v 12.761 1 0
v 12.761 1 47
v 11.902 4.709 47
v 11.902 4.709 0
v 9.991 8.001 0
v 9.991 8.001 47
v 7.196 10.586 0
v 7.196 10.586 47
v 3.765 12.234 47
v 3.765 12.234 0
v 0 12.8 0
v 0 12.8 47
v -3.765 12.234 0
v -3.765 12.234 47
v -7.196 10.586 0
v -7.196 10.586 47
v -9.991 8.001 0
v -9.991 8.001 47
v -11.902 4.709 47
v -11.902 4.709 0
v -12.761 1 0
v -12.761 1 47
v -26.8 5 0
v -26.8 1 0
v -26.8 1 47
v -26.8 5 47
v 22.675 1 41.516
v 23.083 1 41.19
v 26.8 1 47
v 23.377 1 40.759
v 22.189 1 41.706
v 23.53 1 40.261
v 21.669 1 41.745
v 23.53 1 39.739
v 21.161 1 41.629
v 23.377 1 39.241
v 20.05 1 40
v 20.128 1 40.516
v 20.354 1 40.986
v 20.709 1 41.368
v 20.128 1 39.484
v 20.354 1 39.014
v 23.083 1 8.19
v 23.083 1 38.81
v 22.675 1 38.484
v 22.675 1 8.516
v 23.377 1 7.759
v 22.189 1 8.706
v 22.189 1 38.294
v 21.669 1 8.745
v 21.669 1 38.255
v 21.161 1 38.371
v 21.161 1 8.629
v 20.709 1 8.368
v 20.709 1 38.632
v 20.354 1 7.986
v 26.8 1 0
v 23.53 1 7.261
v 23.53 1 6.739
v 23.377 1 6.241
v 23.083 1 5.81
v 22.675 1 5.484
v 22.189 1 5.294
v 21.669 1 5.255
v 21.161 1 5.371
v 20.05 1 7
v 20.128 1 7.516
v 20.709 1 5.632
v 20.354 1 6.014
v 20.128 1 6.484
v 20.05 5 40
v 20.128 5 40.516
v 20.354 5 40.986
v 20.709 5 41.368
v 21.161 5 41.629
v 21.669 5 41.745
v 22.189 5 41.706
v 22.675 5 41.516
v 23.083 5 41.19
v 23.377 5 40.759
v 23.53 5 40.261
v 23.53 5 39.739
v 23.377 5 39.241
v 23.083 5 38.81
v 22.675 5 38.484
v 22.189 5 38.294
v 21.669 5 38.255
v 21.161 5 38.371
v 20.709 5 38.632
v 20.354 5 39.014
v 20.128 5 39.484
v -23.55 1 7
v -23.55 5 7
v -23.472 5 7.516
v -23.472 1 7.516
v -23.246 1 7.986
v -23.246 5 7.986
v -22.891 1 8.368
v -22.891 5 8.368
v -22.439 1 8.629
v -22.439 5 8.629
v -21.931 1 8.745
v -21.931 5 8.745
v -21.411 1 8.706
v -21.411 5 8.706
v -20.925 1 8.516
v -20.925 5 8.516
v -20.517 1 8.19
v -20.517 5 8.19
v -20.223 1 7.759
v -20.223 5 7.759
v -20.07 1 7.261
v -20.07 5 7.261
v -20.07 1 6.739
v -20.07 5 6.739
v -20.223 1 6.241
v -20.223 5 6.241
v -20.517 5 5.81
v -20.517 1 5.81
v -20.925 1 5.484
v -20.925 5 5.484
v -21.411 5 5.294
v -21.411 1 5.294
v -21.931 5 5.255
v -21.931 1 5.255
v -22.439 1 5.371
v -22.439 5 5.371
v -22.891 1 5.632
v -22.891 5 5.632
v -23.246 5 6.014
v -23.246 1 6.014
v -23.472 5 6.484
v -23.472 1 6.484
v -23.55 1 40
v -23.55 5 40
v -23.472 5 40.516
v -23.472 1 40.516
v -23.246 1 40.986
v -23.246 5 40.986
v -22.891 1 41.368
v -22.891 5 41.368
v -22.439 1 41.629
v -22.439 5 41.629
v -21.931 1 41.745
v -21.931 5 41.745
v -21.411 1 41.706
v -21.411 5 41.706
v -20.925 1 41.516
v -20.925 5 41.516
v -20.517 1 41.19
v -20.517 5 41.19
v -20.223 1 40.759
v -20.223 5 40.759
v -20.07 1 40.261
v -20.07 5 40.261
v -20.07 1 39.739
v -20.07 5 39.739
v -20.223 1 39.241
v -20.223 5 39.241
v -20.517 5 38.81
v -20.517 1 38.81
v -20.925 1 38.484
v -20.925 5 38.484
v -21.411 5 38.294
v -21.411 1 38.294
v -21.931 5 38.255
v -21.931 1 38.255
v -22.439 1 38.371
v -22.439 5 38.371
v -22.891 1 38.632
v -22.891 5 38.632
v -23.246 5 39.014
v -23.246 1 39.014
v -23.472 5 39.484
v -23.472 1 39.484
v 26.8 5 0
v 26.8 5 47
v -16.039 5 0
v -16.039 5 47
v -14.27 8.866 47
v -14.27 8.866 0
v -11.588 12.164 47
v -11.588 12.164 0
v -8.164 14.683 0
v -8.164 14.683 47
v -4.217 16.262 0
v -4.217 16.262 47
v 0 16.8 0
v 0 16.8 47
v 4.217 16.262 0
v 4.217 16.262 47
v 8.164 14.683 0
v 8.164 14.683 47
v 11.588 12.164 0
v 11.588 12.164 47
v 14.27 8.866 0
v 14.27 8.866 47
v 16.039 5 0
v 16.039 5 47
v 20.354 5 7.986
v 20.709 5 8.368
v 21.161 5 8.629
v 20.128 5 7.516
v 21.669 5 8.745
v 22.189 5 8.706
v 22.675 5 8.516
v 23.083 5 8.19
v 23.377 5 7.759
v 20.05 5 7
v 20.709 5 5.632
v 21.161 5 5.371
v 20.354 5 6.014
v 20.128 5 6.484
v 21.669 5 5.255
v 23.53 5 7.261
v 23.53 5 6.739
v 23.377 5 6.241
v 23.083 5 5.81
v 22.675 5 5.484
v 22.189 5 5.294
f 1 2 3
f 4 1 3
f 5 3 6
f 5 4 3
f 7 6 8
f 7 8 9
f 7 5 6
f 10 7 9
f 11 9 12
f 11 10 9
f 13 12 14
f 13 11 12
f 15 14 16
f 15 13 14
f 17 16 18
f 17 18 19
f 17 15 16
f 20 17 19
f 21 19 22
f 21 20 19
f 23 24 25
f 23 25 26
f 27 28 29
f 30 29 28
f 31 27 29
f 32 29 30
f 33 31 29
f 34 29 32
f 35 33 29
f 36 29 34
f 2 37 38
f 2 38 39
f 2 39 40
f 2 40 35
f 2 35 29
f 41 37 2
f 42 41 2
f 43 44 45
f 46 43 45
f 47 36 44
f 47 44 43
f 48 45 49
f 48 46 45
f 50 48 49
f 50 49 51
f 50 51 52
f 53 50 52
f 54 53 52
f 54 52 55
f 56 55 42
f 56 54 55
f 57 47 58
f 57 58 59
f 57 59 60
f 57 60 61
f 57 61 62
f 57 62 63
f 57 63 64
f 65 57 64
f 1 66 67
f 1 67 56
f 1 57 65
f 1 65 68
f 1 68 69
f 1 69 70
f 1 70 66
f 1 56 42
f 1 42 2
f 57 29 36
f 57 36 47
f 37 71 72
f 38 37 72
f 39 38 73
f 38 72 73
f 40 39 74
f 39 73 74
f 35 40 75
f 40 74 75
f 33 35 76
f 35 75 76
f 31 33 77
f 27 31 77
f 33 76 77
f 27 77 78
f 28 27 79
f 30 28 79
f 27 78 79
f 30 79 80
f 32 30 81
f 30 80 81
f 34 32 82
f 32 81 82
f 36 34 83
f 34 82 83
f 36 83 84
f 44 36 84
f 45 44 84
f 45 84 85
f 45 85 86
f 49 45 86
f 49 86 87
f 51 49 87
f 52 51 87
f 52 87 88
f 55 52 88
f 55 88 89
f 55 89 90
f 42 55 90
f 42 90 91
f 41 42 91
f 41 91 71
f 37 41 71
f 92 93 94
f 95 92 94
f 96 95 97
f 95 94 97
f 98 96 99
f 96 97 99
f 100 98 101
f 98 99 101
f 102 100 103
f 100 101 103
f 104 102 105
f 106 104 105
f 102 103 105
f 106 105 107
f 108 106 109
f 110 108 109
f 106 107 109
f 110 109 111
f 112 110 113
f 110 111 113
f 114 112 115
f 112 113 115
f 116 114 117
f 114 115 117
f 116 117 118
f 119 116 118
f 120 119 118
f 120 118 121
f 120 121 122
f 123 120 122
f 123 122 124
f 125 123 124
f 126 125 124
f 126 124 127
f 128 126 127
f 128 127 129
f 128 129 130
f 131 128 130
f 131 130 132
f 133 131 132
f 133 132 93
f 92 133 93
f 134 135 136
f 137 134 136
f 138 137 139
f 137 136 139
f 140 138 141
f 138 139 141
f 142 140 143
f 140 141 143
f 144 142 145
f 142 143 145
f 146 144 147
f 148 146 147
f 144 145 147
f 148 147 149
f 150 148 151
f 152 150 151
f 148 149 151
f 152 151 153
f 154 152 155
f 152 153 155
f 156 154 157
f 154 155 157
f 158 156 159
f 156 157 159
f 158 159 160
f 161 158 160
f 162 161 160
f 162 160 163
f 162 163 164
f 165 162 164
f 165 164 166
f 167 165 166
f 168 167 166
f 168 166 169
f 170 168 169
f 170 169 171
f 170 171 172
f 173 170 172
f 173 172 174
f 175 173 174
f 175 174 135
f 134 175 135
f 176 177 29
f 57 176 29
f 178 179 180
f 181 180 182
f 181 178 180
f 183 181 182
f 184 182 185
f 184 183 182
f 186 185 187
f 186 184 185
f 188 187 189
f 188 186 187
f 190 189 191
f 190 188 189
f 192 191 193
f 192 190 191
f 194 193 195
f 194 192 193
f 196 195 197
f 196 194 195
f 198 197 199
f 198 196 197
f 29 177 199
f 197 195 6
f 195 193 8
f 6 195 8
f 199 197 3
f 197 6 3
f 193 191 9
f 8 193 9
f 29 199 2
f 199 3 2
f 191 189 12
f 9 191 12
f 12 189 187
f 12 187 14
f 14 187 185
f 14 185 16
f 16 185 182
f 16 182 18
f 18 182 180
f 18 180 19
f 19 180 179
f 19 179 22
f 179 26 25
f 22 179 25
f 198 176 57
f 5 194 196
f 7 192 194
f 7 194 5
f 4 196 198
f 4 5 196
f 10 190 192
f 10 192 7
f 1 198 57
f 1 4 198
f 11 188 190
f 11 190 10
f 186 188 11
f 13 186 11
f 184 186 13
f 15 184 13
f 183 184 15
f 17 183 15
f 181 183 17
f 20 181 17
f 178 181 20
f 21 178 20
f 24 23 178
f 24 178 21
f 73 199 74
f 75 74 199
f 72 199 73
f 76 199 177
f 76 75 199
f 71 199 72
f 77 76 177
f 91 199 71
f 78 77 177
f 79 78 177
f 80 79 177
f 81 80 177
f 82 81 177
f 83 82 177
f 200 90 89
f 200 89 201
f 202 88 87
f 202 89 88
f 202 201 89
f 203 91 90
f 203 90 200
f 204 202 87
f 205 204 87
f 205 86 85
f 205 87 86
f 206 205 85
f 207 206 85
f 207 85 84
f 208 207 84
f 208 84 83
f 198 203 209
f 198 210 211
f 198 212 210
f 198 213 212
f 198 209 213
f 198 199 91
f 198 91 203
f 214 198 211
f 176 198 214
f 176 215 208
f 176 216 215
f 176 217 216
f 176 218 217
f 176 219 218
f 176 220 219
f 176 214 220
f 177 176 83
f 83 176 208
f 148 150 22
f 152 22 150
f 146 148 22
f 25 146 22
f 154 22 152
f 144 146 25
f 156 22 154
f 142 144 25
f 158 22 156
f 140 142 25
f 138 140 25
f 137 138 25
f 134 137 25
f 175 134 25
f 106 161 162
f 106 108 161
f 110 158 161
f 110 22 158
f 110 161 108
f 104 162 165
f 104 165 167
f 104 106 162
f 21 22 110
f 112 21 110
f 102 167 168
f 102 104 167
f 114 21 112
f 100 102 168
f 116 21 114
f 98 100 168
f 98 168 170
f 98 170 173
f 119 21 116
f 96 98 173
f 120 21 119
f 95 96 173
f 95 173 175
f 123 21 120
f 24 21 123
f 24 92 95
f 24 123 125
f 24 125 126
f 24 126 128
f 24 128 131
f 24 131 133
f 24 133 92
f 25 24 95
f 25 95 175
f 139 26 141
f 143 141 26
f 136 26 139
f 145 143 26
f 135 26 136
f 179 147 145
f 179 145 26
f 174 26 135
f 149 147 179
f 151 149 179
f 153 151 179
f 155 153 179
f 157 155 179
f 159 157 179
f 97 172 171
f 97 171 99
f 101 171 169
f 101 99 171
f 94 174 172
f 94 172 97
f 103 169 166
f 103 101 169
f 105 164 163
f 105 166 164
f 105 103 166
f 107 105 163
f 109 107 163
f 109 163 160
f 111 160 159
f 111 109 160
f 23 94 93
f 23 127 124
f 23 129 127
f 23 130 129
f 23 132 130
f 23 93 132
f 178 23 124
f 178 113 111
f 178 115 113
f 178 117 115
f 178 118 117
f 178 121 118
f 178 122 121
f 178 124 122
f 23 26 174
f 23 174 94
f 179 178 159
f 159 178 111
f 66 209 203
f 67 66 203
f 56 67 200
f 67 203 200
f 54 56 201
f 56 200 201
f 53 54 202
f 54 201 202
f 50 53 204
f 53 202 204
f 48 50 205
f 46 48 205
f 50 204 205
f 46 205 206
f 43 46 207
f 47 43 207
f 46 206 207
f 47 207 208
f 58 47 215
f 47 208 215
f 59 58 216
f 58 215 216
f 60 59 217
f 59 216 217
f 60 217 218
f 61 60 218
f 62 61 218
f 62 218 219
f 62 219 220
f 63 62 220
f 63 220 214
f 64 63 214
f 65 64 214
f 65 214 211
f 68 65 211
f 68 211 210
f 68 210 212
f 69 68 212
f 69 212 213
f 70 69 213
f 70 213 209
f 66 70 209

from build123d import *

# Parameters (mm, degrees)
BOSS_EXTRUDE1_DEPTH = 47
CUT_EXTRUDE1_REACH  = 57.376
SKETCH2_R           = 1.75


with BuildPart() as part:
    # Sketch1 → Boss-Extrude1 (new body)
    with BuildSketch(Plane(origin=(0, 0, 0), x_dir=(0, 1, 0), z_dir=(0, 0, 1))):
        with BuildLine():
            Line((1, 12.760877713), (1, 26.8))
            Line((1, 26.8), (5, 26.8))
            Line((5, 26.8), (5, 16.038703189))
            ThreePointArc((5, 16.038703189), (16.8, 0), (5, -16.038703189))
            Line((5, -16.038703189), (5, -26.8))
            Line((5, -26.8), (1, -26.8))
            Line((1, -26.8), (1, -12.760877713))
            ThreePointArc((1, -12.760877713), (12.8, 0), (1, 12.760877713))
        make_face()
    extrude(amount=BOSS_EXTRUDE1_DEPTH)

    # Sketch2 → Cut-Extrude1 (cut, up to next)
    with BuildSketch(Plane(origin=(0, 5, 0), x_dir=(-1, 0, 0), z_dir=(0, 1, 0)), mode=Mode.PRIVATE) as cut_extrude1_sk1:
        with Locations((-21.8, 40)):
            Circle(SKETCH2_R)
    cut_extrude1_tool1 = extrude(cut_extrude1_sk1.sketch, amount=-CUT_EXTRUDE1_REACH, mode=Mode.PRIVATE) & part.part
    # Sketch2 → Cut-Extrude1 (cut, up to next)
    with BuildSketch(Plane(origin=(0, 5, 0), x_dir=(-1, 0, 0), z_dir=(0, 1, 0)), mode=Mode.PRIVATE) as cut_extrude1_sk2:
        with Locations((-21.8, 7)):
            Circle(SKETCH2_R)
    cut_extrude1_tool2 = extrude(cut_extrude1_sk2.sketch, amount=-CUT_EXTRUDE1_REACH, mode=Mode.PRIVATE) & part.part
    # Sketch2 → Cut-Extrude1 (cut, up to next)
    with BuildSketch(Plane(origin=(0, 5, 0), x_dir=(-1, 0, 0), z_dir=(0, 1, 0)), mode=Mode.PRIVATE) as cut_extrude1_sk3:
        with Locations((21.8, 7)):
            Circle(SKETCH2_R)
    cut_extrude1_tool3 = extrude(cut_extrude1_sk3.sketch, amount=-CUT_EXTRUDE1_REACH, mode=Mode.PRIVATE) & part.part
    # Sketch2 → Cut-Extrude1 (cut, up to next)
    with BuildSketch(Plane(origin=(0, 5, 0), x_dir=(-1, 0, 0), z_dir=(0, 1, 0)), mode=Mode.PRIVATE) as cut_extrude1_sk4:
        with Locations((21.8, 40)):
            Circle(SKETCH2_R)
    cut_extrude1_tool4 = extrude(cut_extrude1_sk4.sketch, amount=-CUT_EXTRUDE1_REACH, mode=Mode.PRIVATE) & part.part
    add(cut_extrude1_tool1.solids().sort_by_distance((21.8, 5, 40))[0], mode=Mode.SUBTRACT)
    add(cut_extrude1_tool2.solids().sort_by_distance((21.8, 5, 7))[0], mode=Mode.SUBTRACT)
    add(cut_extrude1_tool3.solids().sort_by_distance((-21.8, 5, 7))[0], mode=Mode.SUBTRACT)
    add(cut_extrude1_tool4.solids().sort_by_distance((-21.8, 5, 40))[0], mode=Mode.SUBTRACT)


solid = part.part
